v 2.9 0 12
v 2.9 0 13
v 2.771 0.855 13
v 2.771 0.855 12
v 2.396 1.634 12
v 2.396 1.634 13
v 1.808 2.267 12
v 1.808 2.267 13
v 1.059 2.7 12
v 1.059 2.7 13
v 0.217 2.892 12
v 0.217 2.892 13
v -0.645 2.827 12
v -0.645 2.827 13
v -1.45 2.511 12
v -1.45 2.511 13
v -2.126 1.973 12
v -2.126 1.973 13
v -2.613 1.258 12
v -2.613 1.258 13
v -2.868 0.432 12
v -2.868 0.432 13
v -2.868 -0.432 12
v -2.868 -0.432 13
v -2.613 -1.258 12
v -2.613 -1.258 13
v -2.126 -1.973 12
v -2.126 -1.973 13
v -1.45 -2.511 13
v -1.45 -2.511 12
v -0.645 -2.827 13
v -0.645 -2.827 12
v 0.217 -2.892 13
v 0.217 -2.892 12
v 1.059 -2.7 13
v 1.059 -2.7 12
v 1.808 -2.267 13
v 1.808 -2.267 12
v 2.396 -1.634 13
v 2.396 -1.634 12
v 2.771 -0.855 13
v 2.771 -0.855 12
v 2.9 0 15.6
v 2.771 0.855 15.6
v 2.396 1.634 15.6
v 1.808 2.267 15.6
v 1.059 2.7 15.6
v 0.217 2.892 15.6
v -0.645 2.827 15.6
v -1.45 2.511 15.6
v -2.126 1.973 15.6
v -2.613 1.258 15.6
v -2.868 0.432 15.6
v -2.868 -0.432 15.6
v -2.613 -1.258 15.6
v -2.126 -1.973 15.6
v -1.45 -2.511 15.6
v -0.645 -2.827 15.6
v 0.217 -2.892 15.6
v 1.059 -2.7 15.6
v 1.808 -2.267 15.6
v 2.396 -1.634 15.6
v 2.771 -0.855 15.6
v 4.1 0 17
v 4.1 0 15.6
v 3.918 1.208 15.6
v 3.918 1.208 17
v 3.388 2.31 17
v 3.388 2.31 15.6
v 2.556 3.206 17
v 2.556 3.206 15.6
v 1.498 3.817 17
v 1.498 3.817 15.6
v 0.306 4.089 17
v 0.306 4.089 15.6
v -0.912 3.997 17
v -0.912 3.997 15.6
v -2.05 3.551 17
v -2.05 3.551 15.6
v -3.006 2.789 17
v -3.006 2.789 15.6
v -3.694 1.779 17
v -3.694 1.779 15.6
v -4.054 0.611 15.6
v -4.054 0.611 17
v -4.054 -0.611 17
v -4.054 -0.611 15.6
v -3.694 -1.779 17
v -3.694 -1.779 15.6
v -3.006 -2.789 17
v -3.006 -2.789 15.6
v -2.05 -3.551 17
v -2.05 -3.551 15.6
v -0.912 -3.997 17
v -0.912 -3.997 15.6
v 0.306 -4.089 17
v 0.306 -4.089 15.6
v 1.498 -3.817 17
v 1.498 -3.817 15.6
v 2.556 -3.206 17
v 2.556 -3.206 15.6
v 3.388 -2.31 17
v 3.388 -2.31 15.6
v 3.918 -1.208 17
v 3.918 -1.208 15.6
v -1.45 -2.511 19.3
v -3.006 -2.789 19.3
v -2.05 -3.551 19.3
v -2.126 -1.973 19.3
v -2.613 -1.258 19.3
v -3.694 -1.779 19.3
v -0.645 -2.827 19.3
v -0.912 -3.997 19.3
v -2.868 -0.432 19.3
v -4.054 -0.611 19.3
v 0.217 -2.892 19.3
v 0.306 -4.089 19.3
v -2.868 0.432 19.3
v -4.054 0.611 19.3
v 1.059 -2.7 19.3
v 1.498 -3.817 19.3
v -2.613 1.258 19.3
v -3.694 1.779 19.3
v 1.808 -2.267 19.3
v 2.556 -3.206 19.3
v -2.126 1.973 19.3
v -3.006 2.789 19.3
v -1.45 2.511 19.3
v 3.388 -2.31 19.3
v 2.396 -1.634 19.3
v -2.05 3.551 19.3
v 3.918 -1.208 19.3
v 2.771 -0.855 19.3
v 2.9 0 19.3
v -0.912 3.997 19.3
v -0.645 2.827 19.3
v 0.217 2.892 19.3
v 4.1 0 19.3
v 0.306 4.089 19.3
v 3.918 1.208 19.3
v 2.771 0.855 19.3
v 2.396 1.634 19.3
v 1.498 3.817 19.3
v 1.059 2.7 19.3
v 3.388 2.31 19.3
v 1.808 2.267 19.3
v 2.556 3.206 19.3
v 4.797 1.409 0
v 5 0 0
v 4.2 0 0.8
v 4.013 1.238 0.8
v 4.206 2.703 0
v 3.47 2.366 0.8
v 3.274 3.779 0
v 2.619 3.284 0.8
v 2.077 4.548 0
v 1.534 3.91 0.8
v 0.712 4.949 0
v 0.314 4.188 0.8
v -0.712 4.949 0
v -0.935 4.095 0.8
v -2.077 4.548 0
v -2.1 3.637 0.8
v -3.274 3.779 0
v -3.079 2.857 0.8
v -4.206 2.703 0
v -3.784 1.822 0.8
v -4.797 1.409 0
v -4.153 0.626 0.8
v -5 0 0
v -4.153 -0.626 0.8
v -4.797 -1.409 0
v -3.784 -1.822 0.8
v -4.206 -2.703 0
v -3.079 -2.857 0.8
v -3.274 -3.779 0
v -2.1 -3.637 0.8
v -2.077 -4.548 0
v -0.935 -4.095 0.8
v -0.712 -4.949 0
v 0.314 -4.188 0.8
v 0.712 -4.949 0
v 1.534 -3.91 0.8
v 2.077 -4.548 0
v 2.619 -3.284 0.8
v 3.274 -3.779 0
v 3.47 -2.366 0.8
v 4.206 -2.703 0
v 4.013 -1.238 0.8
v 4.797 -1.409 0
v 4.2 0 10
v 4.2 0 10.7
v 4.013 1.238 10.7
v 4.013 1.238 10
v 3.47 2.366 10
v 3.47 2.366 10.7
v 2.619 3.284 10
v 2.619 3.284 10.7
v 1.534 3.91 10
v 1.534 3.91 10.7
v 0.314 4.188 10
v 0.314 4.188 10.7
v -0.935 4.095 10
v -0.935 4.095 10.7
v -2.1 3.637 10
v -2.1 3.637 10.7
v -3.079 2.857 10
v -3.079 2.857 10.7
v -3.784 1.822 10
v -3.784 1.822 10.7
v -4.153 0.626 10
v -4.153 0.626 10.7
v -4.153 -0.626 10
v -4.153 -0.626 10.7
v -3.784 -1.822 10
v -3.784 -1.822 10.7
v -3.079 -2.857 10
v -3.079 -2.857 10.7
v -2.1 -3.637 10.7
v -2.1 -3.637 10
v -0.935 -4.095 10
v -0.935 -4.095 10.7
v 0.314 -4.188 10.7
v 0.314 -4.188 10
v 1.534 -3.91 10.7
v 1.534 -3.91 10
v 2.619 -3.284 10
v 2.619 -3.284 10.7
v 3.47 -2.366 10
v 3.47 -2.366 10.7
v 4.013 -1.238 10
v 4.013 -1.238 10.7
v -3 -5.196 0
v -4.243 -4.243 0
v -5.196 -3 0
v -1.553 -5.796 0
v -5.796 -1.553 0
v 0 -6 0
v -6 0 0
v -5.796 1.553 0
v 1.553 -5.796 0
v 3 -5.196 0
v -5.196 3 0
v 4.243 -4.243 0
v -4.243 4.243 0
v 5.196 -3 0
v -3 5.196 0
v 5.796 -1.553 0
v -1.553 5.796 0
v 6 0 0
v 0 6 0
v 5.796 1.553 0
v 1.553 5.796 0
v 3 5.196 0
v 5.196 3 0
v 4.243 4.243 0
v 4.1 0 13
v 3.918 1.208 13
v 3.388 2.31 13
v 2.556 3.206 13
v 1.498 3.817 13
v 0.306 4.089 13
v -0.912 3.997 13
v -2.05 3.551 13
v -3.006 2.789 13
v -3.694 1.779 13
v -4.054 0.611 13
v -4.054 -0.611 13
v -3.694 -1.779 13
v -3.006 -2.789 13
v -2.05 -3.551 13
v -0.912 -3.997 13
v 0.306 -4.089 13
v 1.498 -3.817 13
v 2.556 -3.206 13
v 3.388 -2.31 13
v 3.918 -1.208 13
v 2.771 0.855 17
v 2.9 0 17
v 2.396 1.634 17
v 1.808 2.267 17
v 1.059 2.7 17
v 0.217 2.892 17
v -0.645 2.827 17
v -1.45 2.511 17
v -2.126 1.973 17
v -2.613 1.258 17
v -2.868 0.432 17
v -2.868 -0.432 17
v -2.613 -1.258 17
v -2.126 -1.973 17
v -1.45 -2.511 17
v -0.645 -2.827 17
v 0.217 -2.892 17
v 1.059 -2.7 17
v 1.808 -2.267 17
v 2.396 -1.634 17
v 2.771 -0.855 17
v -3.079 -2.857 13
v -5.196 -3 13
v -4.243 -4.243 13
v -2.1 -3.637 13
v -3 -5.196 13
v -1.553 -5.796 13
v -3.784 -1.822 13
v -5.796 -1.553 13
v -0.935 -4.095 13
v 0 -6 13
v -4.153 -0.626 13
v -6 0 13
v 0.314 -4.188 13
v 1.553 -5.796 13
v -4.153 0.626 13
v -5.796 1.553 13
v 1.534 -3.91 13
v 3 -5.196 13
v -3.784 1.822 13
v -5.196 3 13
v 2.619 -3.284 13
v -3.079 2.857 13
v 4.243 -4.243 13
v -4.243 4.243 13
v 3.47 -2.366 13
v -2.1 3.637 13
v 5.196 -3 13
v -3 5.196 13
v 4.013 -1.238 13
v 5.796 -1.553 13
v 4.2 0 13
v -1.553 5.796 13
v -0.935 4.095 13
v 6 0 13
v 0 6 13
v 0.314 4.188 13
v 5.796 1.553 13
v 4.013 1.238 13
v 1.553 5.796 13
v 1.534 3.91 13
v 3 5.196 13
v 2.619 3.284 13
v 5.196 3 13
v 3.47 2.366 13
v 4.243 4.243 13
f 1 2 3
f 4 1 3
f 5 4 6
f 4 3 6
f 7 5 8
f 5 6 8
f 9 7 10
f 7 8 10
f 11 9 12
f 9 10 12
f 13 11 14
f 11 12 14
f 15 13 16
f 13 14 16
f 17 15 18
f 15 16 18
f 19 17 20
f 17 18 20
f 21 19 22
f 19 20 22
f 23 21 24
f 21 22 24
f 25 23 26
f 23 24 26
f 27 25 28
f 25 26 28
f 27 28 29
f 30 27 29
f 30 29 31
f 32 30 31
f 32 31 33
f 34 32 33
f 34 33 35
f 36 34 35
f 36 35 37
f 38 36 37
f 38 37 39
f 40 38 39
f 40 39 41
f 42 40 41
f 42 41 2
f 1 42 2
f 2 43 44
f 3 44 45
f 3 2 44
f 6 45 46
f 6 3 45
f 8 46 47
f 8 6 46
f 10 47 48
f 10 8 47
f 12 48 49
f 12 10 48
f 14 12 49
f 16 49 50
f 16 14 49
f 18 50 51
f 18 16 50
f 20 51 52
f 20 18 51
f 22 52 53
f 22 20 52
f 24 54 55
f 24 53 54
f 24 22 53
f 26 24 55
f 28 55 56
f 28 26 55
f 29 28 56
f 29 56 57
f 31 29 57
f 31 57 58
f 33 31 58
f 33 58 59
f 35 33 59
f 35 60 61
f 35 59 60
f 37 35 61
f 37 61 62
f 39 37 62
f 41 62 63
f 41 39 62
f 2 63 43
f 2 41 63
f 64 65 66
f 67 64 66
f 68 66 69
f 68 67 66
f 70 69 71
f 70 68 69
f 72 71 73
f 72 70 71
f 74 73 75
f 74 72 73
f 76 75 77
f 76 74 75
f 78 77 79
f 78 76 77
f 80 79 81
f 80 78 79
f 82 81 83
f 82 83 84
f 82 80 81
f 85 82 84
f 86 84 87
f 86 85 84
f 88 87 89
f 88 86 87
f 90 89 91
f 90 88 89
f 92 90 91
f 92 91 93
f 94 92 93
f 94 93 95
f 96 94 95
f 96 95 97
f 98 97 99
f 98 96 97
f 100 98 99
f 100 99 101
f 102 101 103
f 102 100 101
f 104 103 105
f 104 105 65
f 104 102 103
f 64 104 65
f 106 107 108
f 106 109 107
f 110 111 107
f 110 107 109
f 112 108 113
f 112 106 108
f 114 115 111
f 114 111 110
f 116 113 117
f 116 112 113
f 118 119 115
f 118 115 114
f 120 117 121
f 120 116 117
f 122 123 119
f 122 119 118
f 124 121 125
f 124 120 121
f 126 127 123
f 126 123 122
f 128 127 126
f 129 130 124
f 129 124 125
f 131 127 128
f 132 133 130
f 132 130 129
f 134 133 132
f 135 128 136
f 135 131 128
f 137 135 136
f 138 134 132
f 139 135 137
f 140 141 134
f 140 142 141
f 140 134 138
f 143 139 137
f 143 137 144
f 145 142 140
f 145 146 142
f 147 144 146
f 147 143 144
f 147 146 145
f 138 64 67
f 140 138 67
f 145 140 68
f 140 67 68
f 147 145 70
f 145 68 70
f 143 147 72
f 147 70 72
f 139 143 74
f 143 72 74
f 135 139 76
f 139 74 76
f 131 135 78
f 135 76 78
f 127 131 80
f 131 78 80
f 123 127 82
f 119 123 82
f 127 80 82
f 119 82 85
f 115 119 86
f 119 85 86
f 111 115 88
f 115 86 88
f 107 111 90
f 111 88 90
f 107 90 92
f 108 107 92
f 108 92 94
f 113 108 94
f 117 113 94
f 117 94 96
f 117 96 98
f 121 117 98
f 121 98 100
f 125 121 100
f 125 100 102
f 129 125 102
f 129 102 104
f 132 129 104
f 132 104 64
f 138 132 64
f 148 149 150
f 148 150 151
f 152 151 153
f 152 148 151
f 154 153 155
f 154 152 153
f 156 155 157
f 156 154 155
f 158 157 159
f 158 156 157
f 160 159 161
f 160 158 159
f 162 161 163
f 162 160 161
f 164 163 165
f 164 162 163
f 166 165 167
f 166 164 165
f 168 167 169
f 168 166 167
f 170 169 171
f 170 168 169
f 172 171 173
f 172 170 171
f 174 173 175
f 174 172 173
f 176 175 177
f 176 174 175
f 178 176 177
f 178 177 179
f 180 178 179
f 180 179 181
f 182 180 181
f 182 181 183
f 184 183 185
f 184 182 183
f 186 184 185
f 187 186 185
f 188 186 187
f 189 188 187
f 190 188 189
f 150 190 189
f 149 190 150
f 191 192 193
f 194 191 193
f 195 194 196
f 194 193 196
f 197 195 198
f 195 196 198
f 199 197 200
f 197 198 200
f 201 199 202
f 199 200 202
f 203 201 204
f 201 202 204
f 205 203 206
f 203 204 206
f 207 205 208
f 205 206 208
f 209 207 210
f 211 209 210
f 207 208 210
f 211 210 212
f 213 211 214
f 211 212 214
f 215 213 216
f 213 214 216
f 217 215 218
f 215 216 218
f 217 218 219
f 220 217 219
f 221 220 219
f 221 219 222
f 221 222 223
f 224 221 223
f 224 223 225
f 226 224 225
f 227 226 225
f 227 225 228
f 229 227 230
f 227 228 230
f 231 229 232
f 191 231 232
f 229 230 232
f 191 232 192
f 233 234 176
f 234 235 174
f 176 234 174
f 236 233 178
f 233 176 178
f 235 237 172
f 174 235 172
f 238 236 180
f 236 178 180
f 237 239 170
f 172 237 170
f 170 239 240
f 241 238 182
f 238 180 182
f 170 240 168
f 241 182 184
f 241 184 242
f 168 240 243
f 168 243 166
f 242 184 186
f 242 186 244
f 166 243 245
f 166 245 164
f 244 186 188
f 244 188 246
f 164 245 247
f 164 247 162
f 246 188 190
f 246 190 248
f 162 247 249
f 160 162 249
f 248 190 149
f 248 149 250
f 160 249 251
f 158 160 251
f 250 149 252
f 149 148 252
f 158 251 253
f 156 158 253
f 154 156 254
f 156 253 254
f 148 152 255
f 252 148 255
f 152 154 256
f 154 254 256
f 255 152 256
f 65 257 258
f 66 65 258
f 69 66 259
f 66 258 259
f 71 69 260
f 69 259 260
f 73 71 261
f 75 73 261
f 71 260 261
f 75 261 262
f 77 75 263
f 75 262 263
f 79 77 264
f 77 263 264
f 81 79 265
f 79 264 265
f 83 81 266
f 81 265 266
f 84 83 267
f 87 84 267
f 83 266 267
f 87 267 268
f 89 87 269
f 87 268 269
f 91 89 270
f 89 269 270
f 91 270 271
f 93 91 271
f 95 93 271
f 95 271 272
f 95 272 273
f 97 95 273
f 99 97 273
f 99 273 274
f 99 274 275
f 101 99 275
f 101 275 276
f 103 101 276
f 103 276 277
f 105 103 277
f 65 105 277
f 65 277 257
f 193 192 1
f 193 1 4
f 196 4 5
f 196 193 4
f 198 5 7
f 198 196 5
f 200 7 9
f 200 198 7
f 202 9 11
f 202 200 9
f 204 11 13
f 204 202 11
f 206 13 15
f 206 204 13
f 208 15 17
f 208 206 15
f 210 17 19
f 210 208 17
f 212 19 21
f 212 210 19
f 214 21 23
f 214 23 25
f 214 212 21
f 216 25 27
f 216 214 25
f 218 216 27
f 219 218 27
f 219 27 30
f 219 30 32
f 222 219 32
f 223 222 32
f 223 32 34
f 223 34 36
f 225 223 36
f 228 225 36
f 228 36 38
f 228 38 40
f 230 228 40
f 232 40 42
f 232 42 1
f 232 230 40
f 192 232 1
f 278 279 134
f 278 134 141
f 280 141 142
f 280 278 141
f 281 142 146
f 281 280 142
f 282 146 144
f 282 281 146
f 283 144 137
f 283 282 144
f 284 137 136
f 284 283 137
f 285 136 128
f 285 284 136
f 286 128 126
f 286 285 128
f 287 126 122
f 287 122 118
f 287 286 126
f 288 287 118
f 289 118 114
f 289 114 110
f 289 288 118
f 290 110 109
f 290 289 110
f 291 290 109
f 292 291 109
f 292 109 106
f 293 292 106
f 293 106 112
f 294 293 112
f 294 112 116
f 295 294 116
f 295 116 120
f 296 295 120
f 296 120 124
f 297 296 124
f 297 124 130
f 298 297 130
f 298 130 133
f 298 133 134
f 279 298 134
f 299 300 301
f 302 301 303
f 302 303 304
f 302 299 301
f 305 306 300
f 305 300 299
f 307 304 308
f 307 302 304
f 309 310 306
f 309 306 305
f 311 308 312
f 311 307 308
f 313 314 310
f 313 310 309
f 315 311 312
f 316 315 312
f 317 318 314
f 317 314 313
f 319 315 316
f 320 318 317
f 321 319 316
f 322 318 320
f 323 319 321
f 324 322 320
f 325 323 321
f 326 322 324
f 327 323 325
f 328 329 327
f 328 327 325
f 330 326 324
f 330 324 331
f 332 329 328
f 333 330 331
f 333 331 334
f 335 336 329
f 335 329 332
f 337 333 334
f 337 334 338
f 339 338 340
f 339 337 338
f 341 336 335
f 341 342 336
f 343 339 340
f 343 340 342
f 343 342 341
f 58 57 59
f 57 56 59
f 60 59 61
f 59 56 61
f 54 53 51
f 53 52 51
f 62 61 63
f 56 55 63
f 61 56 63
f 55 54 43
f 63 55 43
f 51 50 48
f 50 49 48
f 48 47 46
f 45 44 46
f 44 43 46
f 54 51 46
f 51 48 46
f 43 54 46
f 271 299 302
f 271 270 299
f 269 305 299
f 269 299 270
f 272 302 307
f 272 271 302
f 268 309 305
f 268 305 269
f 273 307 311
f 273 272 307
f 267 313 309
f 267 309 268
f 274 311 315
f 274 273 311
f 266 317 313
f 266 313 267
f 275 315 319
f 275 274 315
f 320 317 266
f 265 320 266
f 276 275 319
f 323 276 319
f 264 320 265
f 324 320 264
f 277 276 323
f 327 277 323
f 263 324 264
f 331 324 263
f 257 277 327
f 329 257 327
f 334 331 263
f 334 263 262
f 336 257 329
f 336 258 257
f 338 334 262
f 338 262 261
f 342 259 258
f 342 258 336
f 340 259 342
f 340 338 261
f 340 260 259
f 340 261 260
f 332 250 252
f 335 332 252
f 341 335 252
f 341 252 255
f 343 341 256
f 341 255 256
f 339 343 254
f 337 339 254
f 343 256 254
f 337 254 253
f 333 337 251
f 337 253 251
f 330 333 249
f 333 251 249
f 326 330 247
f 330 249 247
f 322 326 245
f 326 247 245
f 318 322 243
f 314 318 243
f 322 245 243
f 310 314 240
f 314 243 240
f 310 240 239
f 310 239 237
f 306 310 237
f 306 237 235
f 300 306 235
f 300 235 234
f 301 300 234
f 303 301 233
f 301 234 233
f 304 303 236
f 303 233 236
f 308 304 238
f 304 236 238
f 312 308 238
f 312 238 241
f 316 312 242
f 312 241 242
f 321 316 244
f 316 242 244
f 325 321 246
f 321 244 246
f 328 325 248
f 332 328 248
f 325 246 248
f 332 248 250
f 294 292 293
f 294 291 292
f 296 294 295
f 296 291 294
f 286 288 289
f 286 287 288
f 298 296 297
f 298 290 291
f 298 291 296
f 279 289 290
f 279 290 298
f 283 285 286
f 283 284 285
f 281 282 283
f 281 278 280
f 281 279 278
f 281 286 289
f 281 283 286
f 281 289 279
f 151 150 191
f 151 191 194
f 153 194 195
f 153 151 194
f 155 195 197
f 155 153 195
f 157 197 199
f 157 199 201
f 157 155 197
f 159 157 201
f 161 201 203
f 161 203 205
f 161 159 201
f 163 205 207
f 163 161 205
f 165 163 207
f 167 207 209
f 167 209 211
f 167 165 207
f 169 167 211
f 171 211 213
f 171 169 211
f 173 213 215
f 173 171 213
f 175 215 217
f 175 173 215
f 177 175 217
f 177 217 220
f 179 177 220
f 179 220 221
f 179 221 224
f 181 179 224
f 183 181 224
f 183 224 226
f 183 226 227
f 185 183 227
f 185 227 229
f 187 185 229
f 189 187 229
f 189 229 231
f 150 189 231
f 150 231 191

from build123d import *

# Parameters (mm, degrees)
F0_R        = 6
F0_R_2      = 4.2
F1_DEPTH    = 13
F2_R        = 4.1
F2_R_2      = 2.9
F3_DEPTH    = 6.3
F4_R        = 4.2
F4_R_2      = 2.9
F5_DEPTH    = 3
F6_S5_R     = 4.2
F6_T6_DEPTH = 9
F7_SIZE     = 0.8
F9_R        = 4.1
F10_DEPTH   = 0.7


# Not quite as in the source:
# - a fillet or chamfer that OpenCascade refuses, or shapes differently, is made with other operations: its cross-section is extruded or revolved along the edge and cut away or added


with BuildPart() as f1:
    # F0 (on Top) → F1 (new body)
    with BuildSketch(Plane.XY):
        Circle(F0_R)
        Circle(F0_R_2, mode=Mode.SUBTRACT)
    extrude(amount=F1_DEPTH)



with BuildPart() as f3:
    # F2 (on face) → F3 (new body)
    with BuildSketch(Plane.XY.offset(13)):
        Circle(F2_R)
        Circle(F2_R_2, mode=Mode.SUBTRACT)
    extrude(amount=F3_DEPTH)


with BuildPart() as f1_1:
    add(f1.part)

    add(f3.part)  # F5 merges F3
    # F4 (on face) → F5 (join)
    with BuildSketch(Plane.XY.offset(13)):
        Circle(F4_R)
        Circle(F4_R_2, mode=Mode.SUBTRACT)
    extrude(amount=-F5_DEPTH)

    # F6: chamfer of 2 on 1 edges, made by hand


with BuildPart() as f6_tool2:
    # F6_s3 → F6_t4 (revolve)
    with BuildSketch(Plane.XZ):
        Polygon((2.9, 12), (4.9, 10), (2.9, 10), align=None)
    revolve(axis=Axis((0, 0, 10), (0, 0, 1)))

    # F6_s5 → F6_t6 (intersect, symmetric)
    with BuildSketch(Plane.XY.offset(11)):
        Circle(F6_S5_R)
    extrude(amount=F6_T6_DEPTH, both=True, mode=Mode.INTERSECT)


with BuildPart() as f1_2:
    add(f1_1.part)

    # F6_t1: cut F6_tool2
    add(f6_tool2.part, mode=Mode.SUBTRACT)

    # F7
    f7_edges = [f1_2.edges().sort_by_distance(p)[0] for p in [
        (-4.2, 0, 0),
    ]]
    chamfer(f7_edges, length=F7_SIZE)

    # F9 (on offset) → F10 (join, symmetric)
    with BuildSketch(Plane.XY.offset(16.3)):
        Circle(F9_R)
    extrude(amount=F10_DEPTH, both=True)


solid = f1_2.part
